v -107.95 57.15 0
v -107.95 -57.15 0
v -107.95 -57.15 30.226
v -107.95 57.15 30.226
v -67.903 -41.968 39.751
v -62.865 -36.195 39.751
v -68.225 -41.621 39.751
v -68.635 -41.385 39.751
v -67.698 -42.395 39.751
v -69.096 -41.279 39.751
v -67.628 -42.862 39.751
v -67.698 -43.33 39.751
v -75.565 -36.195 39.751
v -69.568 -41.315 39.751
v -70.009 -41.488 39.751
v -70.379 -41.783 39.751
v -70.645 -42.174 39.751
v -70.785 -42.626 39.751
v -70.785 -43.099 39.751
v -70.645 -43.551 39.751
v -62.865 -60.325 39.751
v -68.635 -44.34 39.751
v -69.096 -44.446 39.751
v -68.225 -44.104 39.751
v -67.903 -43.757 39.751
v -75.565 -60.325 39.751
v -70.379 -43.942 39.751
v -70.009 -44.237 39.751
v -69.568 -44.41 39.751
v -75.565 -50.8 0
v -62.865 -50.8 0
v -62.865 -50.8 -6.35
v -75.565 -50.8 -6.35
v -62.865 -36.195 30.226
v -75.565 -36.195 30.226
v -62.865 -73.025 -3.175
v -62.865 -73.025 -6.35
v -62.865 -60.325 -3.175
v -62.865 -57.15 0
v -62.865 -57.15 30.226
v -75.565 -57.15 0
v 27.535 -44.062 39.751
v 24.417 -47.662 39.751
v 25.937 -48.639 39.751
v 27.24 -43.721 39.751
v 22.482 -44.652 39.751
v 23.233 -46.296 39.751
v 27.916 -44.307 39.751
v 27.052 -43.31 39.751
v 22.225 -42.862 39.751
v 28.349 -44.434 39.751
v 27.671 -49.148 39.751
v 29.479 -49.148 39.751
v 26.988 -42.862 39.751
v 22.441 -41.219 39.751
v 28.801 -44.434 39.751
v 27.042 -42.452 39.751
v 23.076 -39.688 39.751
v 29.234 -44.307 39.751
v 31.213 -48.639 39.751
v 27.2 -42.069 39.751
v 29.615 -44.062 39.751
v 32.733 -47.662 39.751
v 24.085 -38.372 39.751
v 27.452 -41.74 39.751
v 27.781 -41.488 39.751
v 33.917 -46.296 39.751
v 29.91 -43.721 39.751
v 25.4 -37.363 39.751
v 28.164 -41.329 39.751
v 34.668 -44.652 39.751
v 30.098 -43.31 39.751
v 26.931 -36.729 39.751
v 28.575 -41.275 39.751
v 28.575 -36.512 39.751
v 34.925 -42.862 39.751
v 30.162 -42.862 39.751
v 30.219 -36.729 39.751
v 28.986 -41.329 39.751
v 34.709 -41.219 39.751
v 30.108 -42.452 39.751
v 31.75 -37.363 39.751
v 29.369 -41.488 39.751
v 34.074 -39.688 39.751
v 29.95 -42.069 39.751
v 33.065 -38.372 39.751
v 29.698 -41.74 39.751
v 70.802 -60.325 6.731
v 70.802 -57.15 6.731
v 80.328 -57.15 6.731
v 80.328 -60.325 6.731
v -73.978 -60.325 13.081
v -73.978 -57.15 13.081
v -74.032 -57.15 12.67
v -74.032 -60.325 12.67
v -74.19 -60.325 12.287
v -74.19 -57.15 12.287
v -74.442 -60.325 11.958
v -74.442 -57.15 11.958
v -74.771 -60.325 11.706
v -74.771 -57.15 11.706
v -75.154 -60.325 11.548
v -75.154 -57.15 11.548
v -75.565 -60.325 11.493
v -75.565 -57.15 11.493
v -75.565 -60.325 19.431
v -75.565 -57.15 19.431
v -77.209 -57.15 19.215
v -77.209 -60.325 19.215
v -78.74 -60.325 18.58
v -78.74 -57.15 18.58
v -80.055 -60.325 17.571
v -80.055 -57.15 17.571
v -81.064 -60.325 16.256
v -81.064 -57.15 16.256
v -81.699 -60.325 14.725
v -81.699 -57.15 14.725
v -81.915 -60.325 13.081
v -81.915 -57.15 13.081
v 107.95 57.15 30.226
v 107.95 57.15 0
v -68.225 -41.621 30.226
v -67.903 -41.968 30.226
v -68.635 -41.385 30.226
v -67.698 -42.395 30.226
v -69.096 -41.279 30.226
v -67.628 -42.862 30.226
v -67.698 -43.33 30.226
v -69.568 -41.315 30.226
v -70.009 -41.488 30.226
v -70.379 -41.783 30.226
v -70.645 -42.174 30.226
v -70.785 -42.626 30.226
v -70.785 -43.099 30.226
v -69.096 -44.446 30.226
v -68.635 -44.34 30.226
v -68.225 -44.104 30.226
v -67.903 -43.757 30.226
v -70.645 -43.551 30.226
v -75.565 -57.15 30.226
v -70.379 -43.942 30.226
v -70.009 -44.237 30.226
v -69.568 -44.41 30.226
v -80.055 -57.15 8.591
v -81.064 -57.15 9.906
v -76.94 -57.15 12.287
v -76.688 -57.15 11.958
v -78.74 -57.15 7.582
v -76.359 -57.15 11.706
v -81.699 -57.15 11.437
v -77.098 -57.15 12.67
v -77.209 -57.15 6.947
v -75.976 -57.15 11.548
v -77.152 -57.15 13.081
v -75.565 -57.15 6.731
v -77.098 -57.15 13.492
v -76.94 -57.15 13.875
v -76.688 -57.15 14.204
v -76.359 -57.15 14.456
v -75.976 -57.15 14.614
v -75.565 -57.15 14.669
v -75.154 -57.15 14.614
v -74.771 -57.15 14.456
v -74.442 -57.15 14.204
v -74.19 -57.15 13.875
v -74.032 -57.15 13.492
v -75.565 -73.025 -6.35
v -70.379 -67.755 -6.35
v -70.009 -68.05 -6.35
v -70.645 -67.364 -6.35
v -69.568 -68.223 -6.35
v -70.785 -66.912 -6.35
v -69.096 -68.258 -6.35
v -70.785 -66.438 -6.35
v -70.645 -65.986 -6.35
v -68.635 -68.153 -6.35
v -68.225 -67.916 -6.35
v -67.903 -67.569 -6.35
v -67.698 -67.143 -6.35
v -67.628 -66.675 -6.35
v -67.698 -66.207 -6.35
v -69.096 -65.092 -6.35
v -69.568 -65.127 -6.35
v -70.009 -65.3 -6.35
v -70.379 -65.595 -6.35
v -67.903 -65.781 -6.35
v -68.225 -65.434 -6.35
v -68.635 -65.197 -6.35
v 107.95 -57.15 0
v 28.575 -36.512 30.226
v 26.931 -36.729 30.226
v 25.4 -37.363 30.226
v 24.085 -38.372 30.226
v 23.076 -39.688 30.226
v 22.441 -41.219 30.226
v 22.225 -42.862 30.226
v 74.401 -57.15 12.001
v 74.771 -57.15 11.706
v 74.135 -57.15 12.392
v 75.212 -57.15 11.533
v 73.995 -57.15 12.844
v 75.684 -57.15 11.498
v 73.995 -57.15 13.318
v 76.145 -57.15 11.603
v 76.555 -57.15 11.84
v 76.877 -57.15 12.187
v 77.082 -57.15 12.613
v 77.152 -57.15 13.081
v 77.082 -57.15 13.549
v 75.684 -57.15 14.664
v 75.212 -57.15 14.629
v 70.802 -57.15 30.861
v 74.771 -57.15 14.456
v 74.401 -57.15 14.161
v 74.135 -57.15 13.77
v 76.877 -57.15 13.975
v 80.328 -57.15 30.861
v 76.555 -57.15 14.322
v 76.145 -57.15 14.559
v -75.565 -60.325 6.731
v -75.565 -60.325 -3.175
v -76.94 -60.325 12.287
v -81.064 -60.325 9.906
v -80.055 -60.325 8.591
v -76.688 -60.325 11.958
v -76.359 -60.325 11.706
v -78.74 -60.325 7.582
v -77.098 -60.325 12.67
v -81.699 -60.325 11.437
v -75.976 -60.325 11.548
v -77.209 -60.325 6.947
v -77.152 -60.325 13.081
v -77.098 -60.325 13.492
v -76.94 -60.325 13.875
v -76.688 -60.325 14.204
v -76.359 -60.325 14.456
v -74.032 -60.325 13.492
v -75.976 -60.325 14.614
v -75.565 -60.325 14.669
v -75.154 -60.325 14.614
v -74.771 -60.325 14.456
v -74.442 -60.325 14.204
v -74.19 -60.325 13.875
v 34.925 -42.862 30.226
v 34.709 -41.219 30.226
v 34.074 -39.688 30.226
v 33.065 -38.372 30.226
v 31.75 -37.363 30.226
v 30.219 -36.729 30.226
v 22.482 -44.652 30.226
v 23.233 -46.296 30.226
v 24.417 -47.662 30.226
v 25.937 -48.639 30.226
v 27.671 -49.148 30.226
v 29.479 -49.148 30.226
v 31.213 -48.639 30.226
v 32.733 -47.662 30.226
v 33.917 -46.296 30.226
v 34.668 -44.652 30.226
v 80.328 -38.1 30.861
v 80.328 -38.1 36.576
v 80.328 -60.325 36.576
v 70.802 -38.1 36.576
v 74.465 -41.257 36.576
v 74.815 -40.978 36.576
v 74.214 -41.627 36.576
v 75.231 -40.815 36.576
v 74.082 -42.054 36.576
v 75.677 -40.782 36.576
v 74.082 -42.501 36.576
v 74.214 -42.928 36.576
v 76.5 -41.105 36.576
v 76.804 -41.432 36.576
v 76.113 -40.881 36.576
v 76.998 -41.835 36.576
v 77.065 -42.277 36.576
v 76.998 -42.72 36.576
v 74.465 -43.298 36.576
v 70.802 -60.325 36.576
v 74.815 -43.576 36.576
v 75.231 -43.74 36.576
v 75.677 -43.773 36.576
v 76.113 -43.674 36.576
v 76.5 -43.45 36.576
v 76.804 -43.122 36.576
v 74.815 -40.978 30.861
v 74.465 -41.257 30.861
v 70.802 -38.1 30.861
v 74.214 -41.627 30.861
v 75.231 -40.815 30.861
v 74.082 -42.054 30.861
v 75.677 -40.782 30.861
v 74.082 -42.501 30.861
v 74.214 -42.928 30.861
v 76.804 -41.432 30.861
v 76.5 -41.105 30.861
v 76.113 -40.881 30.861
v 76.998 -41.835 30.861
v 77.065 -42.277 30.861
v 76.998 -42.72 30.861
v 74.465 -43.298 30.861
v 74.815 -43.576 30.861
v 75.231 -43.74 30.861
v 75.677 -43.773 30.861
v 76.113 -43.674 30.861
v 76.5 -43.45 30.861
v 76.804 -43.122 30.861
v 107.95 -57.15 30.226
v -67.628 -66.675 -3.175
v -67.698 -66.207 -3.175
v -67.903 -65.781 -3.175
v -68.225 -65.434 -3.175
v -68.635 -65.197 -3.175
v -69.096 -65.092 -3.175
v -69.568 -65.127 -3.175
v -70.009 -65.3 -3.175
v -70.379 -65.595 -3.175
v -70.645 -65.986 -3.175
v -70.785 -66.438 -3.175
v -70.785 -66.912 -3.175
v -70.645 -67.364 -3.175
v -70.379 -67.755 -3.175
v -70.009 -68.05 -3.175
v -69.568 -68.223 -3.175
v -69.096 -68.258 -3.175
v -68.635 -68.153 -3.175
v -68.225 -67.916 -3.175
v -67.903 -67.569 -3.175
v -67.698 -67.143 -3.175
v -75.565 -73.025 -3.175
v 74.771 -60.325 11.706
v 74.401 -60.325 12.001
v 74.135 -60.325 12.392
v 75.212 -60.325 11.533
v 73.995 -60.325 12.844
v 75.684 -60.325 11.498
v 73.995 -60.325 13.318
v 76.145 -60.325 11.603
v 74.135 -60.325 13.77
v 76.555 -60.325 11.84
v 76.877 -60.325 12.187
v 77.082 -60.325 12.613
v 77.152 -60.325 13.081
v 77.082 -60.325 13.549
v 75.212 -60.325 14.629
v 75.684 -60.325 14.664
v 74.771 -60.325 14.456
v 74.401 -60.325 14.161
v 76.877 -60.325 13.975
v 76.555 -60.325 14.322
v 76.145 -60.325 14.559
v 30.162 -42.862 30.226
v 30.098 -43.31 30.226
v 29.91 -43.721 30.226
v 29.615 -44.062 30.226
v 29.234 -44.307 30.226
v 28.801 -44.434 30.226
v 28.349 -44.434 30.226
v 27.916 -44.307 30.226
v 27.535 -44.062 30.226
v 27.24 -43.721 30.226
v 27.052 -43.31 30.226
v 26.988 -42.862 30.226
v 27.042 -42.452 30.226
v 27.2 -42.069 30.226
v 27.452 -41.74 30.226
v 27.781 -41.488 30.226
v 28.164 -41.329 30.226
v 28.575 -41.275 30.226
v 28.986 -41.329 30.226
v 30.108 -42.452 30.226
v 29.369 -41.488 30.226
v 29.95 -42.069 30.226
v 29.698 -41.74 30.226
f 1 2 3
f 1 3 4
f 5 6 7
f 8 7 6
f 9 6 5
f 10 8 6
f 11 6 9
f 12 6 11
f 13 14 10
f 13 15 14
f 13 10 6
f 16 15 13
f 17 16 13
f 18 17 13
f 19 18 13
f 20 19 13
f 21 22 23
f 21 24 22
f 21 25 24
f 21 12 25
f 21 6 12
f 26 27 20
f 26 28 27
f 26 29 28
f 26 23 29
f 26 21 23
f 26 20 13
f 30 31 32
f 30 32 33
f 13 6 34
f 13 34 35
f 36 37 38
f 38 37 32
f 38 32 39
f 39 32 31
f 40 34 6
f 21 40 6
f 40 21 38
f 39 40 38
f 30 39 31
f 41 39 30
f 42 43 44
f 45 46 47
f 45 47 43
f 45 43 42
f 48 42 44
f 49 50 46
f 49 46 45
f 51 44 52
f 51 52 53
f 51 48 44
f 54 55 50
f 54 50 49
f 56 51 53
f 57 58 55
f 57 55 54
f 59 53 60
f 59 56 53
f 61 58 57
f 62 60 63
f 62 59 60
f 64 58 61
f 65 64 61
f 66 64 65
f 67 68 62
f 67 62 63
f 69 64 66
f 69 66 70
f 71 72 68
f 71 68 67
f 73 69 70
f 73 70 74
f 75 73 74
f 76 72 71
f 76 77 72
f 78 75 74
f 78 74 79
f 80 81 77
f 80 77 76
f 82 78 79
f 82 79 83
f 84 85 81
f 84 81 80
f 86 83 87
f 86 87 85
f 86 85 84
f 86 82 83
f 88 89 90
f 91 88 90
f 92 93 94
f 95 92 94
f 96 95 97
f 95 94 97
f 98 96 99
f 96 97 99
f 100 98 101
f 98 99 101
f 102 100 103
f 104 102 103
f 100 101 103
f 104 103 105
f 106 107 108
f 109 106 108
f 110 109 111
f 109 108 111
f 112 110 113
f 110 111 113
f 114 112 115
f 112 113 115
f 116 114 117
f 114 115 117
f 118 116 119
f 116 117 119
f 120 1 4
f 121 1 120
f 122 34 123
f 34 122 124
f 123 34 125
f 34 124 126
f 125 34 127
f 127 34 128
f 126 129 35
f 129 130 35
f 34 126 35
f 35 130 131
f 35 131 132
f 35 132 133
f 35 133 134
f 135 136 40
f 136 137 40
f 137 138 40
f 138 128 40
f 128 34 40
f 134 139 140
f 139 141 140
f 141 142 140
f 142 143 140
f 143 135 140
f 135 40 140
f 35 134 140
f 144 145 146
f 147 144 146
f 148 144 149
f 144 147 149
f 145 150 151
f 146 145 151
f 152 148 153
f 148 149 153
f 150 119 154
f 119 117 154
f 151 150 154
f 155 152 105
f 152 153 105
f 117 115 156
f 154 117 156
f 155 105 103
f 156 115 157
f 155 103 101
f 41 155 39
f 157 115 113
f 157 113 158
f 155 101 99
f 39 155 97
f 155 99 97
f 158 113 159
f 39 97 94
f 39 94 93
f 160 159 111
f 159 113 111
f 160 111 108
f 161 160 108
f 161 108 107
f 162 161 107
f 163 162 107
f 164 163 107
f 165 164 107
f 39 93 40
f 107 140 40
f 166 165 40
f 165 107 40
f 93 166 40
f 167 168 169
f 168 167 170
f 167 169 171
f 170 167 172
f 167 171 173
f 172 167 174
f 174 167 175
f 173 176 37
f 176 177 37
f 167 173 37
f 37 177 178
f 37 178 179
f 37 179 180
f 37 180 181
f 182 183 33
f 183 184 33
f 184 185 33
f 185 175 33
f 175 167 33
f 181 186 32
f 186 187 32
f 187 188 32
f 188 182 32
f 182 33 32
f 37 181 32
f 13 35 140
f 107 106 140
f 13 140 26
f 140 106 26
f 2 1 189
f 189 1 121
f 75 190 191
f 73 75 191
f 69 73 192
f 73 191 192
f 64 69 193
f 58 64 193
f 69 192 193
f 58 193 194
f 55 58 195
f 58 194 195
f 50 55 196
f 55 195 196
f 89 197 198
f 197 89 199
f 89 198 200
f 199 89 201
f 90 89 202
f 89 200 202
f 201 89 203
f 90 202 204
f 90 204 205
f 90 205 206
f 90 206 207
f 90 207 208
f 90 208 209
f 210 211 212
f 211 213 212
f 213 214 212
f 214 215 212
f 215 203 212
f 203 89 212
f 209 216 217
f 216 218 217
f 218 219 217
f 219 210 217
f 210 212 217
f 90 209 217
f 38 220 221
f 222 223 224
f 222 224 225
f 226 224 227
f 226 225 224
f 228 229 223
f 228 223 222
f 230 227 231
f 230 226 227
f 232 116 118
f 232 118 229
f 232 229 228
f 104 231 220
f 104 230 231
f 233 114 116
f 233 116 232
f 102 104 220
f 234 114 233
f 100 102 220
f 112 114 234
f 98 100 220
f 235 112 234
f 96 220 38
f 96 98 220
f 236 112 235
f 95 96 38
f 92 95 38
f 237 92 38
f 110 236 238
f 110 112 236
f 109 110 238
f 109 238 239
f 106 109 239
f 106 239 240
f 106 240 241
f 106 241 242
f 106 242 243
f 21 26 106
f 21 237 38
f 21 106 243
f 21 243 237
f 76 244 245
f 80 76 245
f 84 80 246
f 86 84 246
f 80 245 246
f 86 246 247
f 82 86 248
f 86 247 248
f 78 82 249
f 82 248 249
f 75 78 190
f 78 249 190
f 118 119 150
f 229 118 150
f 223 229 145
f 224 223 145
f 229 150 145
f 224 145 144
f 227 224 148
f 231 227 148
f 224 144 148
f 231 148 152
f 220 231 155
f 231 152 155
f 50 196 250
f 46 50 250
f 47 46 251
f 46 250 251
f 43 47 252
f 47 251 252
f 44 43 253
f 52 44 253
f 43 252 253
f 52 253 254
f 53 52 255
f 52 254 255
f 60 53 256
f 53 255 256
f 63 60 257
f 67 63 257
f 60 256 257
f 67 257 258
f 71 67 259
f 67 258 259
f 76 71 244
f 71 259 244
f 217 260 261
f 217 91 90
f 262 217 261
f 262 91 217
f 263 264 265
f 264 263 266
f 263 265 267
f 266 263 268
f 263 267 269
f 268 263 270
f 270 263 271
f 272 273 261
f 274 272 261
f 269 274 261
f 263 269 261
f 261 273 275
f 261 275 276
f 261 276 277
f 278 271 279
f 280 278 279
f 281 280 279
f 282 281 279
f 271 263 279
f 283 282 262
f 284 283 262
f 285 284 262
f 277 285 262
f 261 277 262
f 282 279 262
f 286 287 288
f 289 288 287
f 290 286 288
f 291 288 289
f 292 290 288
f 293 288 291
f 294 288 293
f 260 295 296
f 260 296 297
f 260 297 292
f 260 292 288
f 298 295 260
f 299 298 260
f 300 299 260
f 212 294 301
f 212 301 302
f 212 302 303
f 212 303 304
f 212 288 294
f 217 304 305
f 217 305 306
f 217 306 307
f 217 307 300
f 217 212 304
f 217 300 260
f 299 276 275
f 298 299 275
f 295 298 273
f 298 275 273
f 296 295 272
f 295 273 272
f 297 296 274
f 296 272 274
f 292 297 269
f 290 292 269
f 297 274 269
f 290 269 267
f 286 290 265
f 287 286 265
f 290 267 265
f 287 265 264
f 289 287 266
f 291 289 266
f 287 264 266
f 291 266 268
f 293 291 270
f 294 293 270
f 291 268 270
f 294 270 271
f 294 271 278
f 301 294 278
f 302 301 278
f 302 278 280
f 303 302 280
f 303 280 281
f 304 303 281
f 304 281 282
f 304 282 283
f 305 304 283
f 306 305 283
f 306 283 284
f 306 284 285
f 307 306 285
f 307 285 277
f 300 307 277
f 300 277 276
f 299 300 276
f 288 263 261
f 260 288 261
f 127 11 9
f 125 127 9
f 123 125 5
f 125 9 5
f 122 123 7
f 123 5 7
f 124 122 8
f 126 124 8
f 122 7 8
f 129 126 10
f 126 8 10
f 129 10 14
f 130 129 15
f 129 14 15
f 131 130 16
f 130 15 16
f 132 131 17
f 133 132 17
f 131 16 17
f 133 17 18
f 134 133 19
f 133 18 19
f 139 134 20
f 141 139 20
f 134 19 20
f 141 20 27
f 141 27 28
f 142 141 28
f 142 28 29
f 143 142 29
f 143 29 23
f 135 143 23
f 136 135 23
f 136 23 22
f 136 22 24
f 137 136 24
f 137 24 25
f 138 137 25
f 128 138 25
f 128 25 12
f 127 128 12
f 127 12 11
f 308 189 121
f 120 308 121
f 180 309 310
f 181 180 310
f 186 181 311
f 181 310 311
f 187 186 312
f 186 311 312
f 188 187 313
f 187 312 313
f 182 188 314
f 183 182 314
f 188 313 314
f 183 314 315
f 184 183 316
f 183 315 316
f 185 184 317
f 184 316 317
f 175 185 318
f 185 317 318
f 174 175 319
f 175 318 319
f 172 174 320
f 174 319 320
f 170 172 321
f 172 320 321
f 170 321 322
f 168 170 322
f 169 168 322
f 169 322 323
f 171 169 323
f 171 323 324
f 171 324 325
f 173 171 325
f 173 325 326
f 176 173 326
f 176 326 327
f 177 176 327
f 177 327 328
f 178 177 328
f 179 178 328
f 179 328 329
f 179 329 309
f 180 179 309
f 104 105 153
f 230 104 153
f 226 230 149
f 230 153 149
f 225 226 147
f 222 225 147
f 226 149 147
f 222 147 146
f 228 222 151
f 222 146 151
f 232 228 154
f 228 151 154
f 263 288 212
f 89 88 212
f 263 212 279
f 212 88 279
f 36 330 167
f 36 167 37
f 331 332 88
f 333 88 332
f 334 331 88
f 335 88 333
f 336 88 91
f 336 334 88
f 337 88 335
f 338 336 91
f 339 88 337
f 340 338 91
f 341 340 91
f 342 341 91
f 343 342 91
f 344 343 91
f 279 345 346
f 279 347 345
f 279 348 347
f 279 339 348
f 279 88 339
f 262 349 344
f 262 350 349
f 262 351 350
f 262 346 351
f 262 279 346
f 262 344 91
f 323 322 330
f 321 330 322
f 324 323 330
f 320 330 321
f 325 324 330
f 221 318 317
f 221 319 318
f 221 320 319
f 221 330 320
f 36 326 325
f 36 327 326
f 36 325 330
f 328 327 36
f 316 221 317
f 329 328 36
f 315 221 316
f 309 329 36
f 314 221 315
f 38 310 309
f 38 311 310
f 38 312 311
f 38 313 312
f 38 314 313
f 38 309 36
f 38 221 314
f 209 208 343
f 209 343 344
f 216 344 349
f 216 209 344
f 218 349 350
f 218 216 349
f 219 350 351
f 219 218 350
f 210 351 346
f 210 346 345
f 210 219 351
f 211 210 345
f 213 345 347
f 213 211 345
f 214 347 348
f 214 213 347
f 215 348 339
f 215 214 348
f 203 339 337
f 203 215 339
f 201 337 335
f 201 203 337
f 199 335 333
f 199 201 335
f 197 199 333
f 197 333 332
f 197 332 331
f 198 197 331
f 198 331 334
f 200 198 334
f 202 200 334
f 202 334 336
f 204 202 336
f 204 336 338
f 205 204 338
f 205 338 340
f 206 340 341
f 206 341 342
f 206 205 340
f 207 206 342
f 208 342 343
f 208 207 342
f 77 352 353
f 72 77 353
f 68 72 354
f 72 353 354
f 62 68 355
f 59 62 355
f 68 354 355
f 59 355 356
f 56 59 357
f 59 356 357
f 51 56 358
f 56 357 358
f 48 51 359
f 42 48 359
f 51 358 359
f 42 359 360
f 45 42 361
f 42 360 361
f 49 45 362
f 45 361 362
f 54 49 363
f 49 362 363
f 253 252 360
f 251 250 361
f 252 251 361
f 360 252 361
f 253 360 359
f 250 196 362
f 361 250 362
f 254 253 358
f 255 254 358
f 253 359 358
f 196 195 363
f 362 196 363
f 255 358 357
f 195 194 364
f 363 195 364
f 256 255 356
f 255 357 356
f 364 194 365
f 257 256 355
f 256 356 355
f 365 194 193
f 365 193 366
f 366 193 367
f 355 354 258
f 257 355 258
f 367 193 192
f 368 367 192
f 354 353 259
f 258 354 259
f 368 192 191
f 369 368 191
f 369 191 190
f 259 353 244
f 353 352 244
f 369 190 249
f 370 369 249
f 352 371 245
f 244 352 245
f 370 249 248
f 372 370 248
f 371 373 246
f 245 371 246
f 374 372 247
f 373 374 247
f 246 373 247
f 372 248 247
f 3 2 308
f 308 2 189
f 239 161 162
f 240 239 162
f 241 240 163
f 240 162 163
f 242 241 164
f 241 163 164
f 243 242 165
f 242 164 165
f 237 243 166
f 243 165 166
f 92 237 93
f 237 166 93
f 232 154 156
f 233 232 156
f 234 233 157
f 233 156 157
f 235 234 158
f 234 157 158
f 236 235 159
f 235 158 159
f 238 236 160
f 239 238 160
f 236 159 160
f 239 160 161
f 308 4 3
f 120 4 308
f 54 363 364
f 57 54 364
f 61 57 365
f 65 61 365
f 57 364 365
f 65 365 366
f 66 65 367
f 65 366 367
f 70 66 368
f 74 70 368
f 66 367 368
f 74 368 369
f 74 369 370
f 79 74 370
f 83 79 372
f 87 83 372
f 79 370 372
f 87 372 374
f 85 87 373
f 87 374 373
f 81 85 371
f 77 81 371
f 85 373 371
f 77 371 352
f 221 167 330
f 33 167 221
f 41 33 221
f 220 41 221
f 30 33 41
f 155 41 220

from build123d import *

# Parameters (mm, degrees)
F0_W      = 215.9
F0_H      = 114.3
F1_DEPTH  = 30.226
F4_W      = 12.7
F4_H      = 6.35
F4_H_2    = 9.525
F5_DEPTH  = 3.175
F6_W      = 12.7
F6_H      = 6.35
F7_DEPTH  = 6.35
F6_H_2    = 9.525
F8_DEPTH  = 20.955
F9_W      = 12.7
F9_H      = 3.175
F10_DEPTH = 12.7
F11_R     = 1.5875
F12_DEPTH = 25.4
F13_R     = 1.5875
F14_DEPTH = 25.4
F17_DEPTH = 9.525
F18_W     = 9.525
F18_H     = 23.495
F18_R     = 1.5875
F18_H_2   = 5.715
F18_H_3   = 0.635
F19_DEPTH = 3.175
F20_DEPTH = 19.05
F21_R     = 1.5
F22_DEPTH = 25.4


with BuildPart() as f1:
    # F0 (on Top) → F1 (new body)
    with BuildSketch(Plane.XY):
        Rectangle(F0_W, F0_H)
    extrude(amount=F1_DEPTH)


with BuildPart() as f5:
    # F4 (on face) → F5 (new body)
    with BuildSketch(Plane.XZ.offset(57.15)):
        with Locations((-69.215, -3.175)):
            Rectangle(F4_W, F4_H)
        with BuildLine():
            Line((-75.565, 6.731), (-75.565, 0))
            Line((-75.565, 0), (-62.865, 0))
            Line((-62.865, 0), (-62.865, 30.226))
            Line((-62.865, 30.226), (-75.565, 30.226))
            Line((-75.565, 30.226), (-75.565, 19.431))
            ThreePointArc((-75.565, 19.431), (-71.0748719395, 17.5711280605), (-69.215, 13.081))
            ThreePointArc((-69.215, 13.081), (-71.0748719395, 8.5908719395), (-75.565, 6.731))
        make_face()
        with BuildLine():
            ThreePointArc((-81.915, 13.081), (-80.0551280605, 8.5908719395), (-75.565, 6.731))
            Line((-75.565, 6.731), (-75.565, 11.4935))
            ThreePointArc((-75.565, 11.4935), (-76.6875320151, 11.9584679849), (-77.1525, 13.081))
            Line((-77.1525, 13.081), (-81.915, 13.081))
        make_face()
        with BuildLine():
            Line((-75.565, 11.4935), (-75.565, 6.731))
            ThreePointArc((-75.565, 6.731), (-71.0748719395, 8.5908719395), (-69.215, 13.081))
            ThreePointArc((-69.215, 13.081), (-71.0748719395, 17.5711280605), (-75.565, 19.431))
            Line((-75.565, 19.431), (-75.565, 14.6685))
            ThreePointArc((-75.565, 14.6685), (-74.4424679849, 14.2035320151), (-73.9775, 13.081))
            ThreePointArc((-73.9775, 13.081), (-74.4424679849, 11.9584679849), (-75.565, 11.4935))
        make_face()
        with Locations((-69.215, 34.9885)):
            Rectangle(F4_W, F4_H_2)
        with BuildLine():
            ThreePointArc((-75.565, 19.431), (-80.0551280605, 17.5711280605), (-81.915, 13.081))
            Line((-81.915, 13.081), (-77.1525, 13.081))
            ThreePointArc((-77.1525, 13.081), (-76.6875320151, 14.2035320151), (-75.565, 14.6685))
            Line((-75.565, 14.6685), (-75.565, 19.431))
        make_face()
    extrude(amount=F5_DEPTH)

    # F6 (on face) → F7 (join)
    with BuildSketch(Plane(origin=(0, -57.15, 0), x_dir=(-1, 0, 0), z_dir=(0, 1, 0))):
        with Locations((69.215, -3.175)):
            Rectangle(F6_W, F6_H)
    extrude(amount=F7_DEPTH)

    # F6 (on face) → F8 (join)
    with BuildSketch(Plane(origin=(0, -57.15, 0), x_dir=(-1, 0, 0), z_dir=(0, 1, 0))):
        with Locations((69.215, 34.9885)):
            Rectangle(F6_W, F6_H_2)
    extrude(amount=F8_DEPTH)

    # F9 (on face) → F10 (join)
    with BuildSketch(Plane.XZ.offset(60.325)):
        with Locations((-69.215, -4.7625)):
            Rectangle(F9_W, F9_H)
    extrude(amount=F10_DEPTH)

    # F11 (on face) → F12 (cut)
    with BuildSketch(Plane.XY.offset(-3.175)):
        with Locations((-69.215, -66.675)):
            Circle(F11_R)
    extrude(amount=-F12_DEPTH, mode=Mode.SUBTRACT)

    # F13 (on face) → F14 (cut)
    with BuildSketch(Plane.XY.offset(39.751)):
        with Locations((-69.215, -42.8625)):
            Circle(F13_R)
    extrude(amount=-F14_DEPTH, mode=Mode.SUBTRACT)


with BuildPart() as f17:
    # F16 (on face) → F17 (new body)
    with BuildSketch(Plane.XY.offset(30.226)):
        with BuildLine():
            ThreePointArc((22.225, -42.8625), (28.575, -49.2125), (34.925, -42.8625))
            ThreePointArc((34.925, -42.8625), (33.0651280605, -38.3723719395), (28.575, -36.5125))
            Line((28.575, -36.5125), (28.575, -41.275))
            ThreePointArc((28.575, -41.275), (29.6975320151, -41.7399679849), (30.1625, -42.8625))
            ThreePointArc((30.1625, -42.8625), (28.575, -44.45), (26.9875, -42.8625))
            Line((26.9875, -42.8625), (22.225, -42.8625))
        make_face()
        with BuildLine():
            Line((28.575, -41.275), (28.575, -36.5125))
            ThreePointArc((28.575, -36.5125), (24.0848719395, -38.3723719395), (22.225, -42.8625))
            Line((22.225, -42.8625), (26.9875, -42.8625))
            ThreePointArc((26.9875, -42.8625), (27.4524679849, -41.7399679849), (28.575, -41.275))
        make_face()
    extrude(amount=F17_DEPTH)


with BuildPart() as f19:
    # F18 (on face) → F19 (new body)
    with BuildSketch(Plane.XZ.offset(57.15)):
        with Locations((75.565, 18.4785)):
            Rectangle(F18_W, F18_H)
        with Locations((75.565, 13.081)):
            Circle(F18_R, mode=Mode.SUBTRACT)
        with Locations((75.565, 33.7185)):
            Rectangle(F18_W, F18_H_2)
        with Locations((75.565, 30.5435)):
            Rectangle(F18_W, F18_H_3)
    extrude(amount=F19_DEPTH)

    # F18 (on face) → F20 (join)
    with BuildSketch(Plane.XZ.offset(57.15)):
        with Locations((75.565, 33.7185)):
            Rectangle(F18_W, F18_H_2)
    extrude(amount=-F20_DEPTH)

    # F21 (on face) → F22 (cut)
    with BuildSketch(Plane.XY.offset(36.576)):
        with Locations((75.565, -42.2774255276)):
            Circle(F21_R)
    extrude(amount=-F22_DEPTH, mode=Mode.SUBTRACT)


solid = Compound([f1.part, f5.part, f17.part, f19.part])
